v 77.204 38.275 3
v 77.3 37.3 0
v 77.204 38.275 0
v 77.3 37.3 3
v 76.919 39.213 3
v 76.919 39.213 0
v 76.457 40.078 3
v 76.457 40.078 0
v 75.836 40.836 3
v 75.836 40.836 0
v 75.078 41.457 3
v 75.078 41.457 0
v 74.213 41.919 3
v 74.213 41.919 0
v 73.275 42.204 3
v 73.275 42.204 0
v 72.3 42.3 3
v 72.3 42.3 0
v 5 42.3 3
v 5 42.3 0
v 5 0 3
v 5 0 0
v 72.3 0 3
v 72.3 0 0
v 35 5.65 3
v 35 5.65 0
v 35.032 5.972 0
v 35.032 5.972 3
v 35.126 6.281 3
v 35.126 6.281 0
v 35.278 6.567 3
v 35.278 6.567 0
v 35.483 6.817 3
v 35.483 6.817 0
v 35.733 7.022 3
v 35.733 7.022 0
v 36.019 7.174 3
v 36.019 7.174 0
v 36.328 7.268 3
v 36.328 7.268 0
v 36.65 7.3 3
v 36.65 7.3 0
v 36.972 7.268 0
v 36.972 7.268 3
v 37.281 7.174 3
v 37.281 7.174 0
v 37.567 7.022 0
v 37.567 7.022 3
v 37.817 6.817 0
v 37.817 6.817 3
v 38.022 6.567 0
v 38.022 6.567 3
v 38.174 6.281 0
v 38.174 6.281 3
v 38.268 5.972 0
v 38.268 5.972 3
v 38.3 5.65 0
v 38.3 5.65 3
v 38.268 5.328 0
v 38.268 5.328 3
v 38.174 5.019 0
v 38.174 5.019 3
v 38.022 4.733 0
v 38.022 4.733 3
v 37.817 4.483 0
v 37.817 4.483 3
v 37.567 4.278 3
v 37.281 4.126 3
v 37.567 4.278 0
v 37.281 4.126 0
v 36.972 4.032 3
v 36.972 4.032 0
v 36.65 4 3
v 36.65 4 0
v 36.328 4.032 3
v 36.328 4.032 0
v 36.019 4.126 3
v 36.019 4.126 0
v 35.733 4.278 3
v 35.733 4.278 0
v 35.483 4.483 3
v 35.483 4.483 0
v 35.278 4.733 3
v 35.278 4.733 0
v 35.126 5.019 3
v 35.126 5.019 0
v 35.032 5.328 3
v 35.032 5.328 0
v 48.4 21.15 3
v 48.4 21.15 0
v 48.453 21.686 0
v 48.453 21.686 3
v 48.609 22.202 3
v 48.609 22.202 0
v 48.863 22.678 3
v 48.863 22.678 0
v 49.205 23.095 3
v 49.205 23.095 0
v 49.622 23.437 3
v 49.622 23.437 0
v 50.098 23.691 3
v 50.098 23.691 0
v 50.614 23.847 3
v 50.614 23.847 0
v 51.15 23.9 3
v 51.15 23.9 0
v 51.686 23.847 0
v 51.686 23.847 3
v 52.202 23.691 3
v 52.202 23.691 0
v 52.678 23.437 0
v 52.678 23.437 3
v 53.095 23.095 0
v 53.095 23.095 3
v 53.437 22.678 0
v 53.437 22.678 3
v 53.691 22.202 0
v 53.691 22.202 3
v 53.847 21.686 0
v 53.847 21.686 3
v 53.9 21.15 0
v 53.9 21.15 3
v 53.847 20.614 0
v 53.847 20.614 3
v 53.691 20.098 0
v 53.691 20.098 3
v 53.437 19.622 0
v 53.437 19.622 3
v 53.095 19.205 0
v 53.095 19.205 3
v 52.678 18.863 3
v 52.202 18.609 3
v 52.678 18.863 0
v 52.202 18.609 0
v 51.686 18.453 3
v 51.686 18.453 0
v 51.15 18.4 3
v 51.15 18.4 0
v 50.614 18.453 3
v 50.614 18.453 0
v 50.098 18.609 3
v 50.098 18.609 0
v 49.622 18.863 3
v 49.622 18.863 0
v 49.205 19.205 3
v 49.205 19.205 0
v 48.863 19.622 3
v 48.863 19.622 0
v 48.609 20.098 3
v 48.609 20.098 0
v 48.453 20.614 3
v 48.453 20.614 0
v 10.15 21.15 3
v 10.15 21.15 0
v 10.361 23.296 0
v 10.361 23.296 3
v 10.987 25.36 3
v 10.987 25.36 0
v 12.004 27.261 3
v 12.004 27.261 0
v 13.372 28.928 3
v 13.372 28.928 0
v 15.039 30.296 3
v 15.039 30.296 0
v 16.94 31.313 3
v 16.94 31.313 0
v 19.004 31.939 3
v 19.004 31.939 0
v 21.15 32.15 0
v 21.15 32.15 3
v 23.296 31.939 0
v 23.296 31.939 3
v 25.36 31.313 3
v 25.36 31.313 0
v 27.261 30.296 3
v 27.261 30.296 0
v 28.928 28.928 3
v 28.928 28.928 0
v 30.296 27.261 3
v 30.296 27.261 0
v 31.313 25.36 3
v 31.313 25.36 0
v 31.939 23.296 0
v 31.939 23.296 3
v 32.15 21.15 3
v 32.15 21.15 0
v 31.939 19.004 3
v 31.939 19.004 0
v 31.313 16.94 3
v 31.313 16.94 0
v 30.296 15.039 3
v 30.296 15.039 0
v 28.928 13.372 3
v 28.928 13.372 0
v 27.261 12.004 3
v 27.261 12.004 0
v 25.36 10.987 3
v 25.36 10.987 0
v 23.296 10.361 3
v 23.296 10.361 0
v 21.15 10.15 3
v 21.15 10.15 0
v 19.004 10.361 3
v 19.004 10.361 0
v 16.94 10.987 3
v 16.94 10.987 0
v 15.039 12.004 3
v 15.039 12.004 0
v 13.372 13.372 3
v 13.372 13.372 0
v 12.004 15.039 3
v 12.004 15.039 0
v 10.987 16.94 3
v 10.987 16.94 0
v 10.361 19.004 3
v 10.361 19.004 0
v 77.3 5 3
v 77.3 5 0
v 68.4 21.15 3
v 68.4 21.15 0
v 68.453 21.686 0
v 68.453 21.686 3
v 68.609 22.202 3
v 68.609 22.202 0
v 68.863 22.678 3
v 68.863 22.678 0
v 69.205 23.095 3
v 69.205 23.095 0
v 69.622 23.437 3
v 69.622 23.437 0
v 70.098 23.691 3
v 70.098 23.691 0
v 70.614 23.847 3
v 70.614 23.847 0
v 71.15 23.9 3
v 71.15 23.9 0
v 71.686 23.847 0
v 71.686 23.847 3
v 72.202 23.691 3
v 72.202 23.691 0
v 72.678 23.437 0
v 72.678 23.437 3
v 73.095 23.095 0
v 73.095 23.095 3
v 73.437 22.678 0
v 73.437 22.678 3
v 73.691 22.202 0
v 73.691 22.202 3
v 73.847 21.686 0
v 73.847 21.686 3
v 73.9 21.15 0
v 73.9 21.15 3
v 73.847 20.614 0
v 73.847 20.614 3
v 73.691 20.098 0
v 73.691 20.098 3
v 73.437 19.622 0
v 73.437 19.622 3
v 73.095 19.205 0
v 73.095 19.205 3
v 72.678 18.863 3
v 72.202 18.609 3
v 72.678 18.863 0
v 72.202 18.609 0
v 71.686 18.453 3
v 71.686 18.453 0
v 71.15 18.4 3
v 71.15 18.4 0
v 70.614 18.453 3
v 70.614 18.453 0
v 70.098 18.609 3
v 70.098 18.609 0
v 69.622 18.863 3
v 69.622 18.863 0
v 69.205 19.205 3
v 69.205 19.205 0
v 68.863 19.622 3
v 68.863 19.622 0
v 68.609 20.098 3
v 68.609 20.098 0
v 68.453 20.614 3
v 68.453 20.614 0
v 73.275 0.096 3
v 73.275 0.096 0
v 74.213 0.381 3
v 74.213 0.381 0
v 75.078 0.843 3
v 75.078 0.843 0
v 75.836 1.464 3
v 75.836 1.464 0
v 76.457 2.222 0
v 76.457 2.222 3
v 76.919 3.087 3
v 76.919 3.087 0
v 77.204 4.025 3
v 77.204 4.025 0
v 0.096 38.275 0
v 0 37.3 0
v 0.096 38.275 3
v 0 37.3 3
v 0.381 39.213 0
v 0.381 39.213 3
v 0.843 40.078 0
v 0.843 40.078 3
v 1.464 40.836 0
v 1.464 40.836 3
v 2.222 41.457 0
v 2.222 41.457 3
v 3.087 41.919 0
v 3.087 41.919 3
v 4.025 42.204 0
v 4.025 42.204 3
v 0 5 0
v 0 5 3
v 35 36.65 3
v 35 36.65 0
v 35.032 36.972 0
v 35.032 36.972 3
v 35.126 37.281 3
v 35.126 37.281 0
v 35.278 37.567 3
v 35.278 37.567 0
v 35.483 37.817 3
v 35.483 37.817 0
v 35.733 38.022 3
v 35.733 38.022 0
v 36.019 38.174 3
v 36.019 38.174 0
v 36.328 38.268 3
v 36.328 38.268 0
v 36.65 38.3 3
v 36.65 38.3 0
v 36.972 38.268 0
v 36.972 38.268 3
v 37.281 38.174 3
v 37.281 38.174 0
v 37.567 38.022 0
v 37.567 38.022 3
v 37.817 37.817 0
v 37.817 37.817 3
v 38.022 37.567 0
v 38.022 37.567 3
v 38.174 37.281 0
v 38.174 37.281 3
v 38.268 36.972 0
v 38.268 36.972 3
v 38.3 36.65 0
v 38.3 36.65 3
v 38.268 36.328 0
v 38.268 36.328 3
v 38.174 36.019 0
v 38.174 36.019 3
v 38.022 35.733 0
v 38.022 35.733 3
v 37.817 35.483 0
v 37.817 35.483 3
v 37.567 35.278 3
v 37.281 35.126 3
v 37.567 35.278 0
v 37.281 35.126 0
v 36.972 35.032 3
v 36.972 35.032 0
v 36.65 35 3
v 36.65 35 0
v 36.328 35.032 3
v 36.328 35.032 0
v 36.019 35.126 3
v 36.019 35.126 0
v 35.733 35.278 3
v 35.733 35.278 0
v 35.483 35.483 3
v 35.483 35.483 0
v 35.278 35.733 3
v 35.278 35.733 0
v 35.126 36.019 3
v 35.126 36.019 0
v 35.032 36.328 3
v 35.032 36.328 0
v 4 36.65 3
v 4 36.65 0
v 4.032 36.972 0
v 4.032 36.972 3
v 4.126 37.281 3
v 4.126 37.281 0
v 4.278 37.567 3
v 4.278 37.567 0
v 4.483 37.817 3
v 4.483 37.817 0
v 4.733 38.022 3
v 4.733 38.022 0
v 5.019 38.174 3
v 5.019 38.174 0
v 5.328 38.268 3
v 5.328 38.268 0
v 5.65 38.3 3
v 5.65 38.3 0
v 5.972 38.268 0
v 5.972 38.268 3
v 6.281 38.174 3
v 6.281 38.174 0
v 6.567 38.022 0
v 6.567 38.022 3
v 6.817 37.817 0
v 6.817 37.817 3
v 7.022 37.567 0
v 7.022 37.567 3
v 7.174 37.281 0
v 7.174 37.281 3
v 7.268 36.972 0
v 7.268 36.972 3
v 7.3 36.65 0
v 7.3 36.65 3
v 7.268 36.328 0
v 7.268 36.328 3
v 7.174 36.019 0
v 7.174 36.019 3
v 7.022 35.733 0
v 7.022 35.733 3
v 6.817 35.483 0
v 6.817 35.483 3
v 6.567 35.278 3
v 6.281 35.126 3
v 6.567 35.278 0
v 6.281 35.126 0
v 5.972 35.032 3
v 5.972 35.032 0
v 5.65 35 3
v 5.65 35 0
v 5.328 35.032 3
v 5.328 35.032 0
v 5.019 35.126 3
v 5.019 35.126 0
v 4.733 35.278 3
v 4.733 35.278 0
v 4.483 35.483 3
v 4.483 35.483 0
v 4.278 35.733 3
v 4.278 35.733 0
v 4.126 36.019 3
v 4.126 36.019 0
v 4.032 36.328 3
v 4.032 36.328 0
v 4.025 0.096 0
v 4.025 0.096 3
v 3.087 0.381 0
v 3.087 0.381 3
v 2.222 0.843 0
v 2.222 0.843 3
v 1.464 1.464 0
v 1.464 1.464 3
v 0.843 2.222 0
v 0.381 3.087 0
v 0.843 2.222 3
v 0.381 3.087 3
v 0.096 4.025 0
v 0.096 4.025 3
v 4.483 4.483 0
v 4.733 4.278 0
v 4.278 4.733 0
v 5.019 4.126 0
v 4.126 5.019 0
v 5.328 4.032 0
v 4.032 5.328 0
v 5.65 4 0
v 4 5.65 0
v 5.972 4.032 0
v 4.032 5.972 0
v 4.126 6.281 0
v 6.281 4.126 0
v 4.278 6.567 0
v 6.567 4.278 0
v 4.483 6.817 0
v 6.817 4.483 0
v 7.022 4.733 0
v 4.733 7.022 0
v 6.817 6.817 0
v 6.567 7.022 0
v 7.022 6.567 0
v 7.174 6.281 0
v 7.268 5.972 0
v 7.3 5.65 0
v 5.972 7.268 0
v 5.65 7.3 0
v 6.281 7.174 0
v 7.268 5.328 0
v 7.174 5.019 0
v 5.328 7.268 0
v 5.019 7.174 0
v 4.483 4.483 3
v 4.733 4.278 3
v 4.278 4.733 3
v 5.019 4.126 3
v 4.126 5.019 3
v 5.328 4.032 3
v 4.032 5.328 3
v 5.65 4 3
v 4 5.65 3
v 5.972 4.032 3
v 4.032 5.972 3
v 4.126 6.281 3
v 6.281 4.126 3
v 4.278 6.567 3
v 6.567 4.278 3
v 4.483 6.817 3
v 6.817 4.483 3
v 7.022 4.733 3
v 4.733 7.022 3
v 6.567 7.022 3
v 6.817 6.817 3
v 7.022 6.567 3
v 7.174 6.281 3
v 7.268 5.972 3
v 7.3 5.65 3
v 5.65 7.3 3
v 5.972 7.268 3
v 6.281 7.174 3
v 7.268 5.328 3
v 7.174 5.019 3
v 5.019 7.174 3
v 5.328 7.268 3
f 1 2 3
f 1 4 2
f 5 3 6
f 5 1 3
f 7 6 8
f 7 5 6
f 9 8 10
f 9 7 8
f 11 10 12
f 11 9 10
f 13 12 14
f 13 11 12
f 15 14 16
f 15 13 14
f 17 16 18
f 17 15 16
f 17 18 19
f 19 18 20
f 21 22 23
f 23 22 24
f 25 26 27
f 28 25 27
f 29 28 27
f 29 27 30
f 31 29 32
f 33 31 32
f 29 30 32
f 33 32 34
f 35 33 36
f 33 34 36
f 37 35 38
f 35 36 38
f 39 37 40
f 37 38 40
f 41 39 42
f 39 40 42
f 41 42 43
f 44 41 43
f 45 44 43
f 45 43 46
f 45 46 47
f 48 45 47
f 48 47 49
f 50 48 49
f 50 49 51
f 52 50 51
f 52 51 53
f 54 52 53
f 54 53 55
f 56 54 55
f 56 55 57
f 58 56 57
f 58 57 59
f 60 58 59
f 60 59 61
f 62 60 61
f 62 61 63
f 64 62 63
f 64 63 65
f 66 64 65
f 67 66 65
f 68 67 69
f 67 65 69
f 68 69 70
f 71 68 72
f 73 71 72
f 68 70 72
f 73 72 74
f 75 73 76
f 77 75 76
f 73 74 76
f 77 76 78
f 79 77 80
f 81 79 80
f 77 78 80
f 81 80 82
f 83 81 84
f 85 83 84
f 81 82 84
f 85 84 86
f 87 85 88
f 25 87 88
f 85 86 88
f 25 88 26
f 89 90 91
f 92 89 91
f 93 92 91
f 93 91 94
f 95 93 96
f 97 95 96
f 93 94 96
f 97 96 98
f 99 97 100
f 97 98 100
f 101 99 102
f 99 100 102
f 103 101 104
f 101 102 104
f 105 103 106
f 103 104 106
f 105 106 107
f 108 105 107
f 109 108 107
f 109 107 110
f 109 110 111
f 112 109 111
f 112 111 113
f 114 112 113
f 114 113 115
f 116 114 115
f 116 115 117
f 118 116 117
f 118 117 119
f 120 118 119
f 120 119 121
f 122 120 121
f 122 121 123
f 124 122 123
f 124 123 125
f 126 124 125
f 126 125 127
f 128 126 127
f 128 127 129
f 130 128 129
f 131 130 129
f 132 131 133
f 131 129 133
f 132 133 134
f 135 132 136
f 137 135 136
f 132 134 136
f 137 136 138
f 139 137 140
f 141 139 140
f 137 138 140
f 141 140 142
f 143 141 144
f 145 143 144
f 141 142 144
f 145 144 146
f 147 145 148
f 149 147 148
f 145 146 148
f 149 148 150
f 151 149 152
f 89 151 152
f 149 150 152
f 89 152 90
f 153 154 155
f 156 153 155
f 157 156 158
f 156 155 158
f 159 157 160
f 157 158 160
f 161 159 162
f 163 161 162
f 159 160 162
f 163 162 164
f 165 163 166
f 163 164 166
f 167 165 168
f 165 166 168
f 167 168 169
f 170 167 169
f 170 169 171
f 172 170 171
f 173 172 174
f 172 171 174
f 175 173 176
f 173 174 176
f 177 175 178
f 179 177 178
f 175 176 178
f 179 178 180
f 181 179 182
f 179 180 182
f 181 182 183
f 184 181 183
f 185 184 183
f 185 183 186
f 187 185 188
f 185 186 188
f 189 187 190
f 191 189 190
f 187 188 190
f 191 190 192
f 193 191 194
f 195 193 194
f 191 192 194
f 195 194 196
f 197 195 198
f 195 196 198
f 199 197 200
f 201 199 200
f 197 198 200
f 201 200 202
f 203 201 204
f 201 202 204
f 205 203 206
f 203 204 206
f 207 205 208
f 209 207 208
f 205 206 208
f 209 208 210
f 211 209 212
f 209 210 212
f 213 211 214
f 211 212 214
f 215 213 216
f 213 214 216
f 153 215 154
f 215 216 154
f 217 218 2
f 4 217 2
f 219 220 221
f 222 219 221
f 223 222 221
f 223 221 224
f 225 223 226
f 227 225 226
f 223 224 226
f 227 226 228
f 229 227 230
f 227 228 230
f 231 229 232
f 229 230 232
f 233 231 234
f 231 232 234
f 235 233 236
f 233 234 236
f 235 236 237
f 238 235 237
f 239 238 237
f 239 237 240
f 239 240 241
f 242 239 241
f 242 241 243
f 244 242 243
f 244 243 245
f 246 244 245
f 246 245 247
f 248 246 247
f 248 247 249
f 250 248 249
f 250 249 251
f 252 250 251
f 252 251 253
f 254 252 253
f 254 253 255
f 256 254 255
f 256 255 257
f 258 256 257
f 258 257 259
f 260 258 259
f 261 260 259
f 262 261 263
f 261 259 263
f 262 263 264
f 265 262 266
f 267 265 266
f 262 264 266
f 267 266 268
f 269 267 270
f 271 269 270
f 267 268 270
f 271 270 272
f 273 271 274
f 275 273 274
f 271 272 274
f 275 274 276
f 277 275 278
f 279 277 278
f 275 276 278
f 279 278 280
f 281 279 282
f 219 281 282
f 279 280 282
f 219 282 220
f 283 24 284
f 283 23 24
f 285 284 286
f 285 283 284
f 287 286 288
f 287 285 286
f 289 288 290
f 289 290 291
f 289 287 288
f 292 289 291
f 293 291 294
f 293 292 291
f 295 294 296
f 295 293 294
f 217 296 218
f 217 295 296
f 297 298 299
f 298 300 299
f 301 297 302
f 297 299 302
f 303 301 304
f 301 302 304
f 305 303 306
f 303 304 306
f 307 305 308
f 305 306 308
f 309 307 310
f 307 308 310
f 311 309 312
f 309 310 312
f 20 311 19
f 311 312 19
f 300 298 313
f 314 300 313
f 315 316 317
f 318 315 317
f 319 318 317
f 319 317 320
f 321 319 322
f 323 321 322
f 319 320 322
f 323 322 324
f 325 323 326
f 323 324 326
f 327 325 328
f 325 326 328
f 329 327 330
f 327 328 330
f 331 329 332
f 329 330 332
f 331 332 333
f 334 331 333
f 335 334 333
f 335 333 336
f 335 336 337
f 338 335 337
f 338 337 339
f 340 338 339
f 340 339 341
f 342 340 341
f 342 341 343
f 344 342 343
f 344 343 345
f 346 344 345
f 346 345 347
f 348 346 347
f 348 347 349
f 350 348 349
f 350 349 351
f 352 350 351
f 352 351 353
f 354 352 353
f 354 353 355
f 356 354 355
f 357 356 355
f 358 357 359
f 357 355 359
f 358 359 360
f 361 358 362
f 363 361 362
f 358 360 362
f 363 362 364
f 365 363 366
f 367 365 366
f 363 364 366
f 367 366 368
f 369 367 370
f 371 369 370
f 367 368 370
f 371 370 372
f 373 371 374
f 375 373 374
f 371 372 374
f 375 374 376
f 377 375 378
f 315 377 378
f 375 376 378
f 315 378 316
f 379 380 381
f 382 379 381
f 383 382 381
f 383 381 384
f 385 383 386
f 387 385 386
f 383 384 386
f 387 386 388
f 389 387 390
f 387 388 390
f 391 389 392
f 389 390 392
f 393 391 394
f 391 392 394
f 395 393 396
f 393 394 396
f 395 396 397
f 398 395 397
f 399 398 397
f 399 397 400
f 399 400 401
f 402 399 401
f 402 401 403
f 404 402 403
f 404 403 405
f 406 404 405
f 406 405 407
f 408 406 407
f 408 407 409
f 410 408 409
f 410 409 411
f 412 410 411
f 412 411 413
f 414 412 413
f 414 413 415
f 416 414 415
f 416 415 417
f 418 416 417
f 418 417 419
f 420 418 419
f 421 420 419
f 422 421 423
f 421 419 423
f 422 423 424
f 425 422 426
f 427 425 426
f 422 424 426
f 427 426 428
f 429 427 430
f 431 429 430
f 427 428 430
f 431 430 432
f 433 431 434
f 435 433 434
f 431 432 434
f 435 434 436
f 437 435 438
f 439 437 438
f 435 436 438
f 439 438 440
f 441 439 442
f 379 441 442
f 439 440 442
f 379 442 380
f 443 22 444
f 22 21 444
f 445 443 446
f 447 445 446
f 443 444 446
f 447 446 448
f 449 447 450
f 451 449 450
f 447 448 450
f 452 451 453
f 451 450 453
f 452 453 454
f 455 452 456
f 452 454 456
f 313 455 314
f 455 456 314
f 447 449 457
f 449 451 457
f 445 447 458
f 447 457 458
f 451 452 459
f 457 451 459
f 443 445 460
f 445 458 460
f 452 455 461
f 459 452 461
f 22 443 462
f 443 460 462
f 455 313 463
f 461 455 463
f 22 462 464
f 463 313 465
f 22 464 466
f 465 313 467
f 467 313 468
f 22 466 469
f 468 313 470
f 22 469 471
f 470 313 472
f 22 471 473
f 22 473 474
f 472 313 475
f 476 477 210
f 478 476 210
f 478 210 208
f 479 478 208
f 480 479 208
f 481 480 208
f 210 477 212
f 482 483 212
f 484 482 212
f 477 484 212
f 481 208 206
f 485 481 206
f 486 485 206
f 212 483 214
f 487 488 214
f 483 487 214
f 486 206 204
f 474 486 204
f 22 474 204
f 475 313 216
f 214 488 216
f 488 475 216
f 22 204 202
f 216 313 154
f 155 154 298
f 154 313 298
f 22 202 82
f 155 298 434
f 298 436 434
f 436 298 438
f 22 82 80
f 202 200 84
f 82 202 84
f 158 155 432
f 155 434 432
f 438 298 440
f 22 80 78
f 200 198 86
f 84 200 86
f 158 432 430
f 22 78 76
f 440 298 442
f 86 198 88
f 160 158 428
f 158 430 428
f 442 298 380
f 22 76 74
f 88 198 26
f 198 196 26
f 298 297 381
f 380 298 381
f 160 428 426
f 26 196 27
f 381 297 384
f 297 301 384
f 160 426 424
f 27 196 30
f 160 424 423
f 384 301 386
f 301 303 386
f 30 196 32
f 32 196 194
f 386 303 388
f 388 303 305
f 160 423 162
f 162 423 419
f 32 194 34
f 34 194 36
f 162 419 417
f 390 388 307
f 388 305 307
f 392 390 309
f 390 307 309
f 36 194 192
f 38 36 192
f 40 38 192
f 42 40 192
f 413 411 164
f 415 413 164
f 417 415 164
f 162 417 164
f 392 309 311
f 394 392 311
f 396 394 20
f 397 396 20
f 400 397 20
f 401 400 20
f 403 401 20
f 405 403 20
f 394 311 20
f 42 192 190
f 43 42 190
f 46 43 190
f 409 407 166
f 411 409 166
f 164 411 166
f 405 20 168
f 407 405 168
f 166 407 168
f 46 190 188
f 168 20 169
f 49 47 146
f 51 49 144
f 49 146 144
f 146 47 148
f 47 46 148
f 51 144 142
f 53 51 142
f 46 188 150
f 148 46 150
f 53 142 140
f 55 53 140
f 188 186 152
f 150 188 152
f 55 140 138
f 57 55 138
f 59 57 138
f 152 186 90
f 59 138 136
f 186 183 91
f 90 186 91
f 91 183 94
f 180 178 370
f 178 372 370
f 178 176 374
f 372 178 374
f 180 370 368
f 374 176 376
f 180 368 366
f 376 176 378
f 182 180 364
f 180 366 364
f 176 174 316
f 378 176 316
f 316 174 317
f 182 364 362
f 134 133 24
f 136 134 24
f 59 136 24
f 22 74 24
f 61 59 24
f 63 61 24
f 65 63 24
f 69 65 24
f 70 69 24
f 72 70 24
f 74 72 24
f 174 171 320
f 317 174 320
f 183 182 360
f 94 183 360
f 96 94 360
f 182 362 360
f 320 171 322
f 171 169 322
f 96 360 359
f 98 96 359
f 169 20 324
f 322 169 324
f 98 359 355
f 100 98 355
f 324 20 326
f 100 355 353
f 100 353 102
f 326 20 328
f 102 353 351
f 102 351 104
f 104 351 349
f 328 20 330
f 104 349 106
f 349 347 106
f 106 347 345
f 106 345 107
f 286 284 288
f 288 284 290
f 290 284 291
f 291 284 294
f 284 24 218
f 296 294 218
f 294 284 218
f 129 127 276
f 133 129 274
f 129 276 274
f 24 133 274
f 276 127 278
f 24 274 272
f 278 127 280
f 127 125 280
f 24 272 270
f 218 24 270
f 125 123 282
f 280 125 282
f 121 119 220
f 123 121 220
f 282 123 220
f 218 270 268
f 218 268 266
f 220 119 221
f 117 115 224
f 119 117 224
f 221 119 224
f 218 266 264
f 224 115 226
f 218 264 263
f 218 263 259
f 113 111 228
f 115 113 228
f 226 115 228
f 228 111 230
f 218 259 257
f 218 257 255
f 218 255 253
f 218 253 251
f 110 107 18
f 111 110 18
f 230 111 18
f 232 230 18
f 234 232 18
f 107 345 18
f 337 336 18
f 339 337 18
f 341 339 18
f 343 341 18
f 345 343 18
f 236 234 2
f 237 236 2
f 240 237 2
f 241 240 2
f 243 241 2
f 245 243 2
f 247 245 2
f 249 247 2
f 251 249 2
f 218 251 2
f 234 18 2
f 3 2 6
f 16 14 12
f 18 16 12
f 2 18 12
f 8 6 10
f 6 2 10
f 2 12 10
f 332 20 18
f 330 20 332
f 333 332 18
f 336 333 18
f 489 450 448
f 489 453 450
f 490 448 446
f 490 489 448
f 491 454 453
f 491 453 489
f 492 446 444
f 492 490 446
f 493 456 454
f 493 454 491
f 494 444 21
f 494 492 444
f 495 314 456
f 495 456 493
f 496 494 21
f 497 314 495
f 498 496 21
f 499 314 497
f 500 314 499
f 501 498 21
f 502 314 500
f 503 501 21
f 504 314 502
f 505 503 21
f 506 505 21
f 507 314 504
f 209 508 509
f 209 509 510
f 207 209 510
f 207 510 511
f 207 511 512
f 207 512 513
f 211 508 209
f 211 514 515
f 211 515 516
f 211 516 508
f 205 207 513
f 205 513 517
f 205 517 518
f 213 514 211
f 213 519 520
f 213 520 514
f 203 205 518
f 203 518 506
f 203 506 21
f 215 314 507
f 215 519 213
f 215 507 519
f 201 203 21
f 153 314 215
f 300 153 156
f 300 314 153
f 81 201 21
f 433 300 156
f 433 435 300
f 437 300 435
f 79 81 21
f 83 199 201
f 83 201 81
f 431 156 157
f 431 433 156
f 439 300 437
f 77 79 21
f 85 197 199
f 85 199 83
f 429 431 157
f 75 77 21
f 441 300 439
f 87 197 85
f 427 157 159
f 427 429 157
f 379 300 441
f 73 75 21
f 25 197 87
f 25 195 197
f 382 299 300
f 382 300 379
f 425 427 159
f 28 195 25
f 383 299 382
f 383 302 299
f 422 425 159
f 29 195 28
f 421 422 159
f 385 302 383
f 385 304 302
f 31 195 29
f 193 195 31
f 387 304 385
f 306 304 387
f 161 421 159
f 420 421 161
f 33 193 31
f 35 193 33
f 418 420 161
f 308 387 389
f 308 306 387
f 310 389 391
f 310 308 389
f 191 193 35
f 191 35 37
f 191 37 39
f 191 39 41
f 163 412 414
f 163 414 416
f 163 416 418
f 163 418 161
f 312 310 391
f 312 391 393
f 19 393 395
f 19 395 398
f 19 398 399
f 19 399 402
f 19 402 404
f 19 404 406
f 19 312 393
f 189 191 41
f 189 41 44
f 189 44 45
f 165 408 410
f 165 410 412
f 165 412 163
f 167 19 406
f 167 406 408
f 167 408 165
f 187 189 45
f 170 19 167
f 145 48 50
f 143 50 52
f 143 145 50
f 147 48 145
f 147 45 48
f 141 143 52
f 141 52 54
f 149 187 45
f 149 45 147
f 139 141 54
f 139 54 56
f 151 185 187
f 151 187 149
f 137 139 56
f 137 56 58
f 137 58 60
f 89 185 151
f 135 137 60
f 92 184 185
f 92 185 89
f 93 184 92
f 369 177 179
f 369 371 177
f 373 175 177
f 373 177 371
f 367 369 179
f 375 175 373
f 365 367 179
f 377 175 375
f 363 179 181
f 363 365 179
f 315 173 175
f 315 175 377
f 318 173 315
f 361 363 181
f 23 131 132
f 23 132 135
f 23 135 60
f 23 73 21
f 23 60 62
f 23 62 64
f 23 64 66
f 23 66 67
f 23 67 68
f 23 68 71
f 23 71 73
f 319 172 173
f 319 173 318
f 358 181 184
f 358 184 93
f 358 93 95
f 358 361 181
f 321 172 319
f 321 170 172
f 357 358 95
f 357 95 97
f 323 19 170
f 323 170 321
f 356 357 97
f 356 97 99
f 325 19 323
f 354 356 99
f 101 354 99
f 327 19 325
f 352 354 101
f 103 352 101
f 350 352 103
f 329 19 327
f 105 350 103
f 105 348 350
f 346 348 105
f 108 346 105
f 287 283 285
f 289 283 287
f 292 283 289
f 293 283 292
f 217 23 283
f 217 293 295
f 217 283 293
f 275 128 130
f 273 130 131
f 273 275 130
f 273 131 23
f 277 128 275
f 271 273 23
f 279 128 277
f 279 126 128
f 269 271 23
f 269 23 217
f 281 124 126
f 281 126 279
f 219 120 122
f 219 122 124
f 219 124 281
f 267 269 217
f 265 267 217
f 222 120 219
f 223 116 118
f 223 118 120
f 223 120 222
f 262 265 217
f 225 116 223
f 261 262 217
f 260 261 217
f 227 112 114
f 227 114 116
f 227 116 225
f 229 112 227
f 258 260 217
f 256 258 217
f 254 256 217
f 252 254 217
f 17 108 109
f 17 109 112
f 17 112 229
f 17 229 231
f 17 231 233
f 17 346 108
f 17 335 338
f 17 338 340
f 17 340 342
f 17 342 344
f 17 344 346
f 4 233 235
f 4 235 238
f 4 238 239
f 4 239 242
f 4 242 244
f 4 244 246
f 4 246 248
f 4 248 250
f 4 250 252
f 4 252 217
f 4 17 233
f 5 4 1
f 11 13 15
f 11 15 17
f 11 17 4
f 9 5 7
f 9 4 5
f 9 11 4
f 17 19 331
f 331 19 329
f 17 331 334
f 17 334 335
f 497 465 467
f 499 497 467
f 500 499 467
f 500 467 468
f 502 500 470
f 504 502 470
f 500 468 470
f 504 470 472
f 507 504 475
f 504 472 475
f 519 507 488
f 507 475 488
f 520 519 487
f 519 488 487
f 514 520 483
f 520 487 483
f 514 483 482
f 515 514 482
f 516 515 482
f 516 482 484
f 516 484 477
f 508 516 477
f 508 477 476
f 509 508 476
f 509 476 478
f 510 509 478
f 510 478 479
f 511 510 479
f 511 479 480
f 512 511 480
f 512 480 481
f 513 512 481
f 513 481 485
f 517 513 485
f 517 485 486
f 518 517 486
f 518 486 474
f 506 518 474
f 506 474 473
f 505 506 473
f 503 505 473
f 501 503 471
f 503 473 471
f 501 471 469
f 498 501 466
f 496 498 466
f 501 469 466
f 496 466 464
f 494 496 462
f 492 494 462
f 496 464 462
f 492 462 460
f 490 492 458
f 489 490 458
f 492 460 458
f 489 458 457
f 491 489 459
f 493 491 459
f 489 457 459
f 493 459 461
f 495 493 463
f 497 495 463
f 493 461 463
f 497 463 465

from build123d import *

# Parameters (mm, degrees)
F1_DEPTH = 3
F3_D     = 3.3
F5_D     = 5.5
F6_R     = 5


with BuildPart() as f1:
    # F0 (on Top) → F1 (new body)
    with BuildSketch(Plane.XY):
        Polygon((0, 21.15), (0, 0), (77.3, 0), (77.3, 42.3), (0, 42.3), align=None)
        with BuildLine():
            ThreePointArc((32.15, 21.15), (21.15, 10.15), (10.15, 21.15))
            ThreePointArc((10.15, 21.15), (21.15, 32.15), (32.15, 21.15))
        make_face(mode=Mode.SUBTRACT)
    extrude(amount=F1_DEPTH)

    # F3 (through all)
    with Locations(Plane.XY.offset(3)):
        with Locations((5.65, 36.65), (36.65, 36.65), (36.65, 5.65), (5.65, 5.65)):
            Hole(F3_D / 2)

    # F5 (through all)
    with Locations(Plane.XY.offset(3)):
        with Locations((51.15, 21.15), (71.15, 21.15)):
            Hole(F5_D / 2)

    # F6
    f6_edges = [f1.edges().sort_by_distance(p)[0] for p in [
        (77.3, 0, 1.5),
        (0, 0, 1.5),
        (77.3, 42.3, 1.5),
        (0, 42.3, 1.5),
    ]]
    fillet(f6_edges, radius=F6_R)


solid = f1.part
